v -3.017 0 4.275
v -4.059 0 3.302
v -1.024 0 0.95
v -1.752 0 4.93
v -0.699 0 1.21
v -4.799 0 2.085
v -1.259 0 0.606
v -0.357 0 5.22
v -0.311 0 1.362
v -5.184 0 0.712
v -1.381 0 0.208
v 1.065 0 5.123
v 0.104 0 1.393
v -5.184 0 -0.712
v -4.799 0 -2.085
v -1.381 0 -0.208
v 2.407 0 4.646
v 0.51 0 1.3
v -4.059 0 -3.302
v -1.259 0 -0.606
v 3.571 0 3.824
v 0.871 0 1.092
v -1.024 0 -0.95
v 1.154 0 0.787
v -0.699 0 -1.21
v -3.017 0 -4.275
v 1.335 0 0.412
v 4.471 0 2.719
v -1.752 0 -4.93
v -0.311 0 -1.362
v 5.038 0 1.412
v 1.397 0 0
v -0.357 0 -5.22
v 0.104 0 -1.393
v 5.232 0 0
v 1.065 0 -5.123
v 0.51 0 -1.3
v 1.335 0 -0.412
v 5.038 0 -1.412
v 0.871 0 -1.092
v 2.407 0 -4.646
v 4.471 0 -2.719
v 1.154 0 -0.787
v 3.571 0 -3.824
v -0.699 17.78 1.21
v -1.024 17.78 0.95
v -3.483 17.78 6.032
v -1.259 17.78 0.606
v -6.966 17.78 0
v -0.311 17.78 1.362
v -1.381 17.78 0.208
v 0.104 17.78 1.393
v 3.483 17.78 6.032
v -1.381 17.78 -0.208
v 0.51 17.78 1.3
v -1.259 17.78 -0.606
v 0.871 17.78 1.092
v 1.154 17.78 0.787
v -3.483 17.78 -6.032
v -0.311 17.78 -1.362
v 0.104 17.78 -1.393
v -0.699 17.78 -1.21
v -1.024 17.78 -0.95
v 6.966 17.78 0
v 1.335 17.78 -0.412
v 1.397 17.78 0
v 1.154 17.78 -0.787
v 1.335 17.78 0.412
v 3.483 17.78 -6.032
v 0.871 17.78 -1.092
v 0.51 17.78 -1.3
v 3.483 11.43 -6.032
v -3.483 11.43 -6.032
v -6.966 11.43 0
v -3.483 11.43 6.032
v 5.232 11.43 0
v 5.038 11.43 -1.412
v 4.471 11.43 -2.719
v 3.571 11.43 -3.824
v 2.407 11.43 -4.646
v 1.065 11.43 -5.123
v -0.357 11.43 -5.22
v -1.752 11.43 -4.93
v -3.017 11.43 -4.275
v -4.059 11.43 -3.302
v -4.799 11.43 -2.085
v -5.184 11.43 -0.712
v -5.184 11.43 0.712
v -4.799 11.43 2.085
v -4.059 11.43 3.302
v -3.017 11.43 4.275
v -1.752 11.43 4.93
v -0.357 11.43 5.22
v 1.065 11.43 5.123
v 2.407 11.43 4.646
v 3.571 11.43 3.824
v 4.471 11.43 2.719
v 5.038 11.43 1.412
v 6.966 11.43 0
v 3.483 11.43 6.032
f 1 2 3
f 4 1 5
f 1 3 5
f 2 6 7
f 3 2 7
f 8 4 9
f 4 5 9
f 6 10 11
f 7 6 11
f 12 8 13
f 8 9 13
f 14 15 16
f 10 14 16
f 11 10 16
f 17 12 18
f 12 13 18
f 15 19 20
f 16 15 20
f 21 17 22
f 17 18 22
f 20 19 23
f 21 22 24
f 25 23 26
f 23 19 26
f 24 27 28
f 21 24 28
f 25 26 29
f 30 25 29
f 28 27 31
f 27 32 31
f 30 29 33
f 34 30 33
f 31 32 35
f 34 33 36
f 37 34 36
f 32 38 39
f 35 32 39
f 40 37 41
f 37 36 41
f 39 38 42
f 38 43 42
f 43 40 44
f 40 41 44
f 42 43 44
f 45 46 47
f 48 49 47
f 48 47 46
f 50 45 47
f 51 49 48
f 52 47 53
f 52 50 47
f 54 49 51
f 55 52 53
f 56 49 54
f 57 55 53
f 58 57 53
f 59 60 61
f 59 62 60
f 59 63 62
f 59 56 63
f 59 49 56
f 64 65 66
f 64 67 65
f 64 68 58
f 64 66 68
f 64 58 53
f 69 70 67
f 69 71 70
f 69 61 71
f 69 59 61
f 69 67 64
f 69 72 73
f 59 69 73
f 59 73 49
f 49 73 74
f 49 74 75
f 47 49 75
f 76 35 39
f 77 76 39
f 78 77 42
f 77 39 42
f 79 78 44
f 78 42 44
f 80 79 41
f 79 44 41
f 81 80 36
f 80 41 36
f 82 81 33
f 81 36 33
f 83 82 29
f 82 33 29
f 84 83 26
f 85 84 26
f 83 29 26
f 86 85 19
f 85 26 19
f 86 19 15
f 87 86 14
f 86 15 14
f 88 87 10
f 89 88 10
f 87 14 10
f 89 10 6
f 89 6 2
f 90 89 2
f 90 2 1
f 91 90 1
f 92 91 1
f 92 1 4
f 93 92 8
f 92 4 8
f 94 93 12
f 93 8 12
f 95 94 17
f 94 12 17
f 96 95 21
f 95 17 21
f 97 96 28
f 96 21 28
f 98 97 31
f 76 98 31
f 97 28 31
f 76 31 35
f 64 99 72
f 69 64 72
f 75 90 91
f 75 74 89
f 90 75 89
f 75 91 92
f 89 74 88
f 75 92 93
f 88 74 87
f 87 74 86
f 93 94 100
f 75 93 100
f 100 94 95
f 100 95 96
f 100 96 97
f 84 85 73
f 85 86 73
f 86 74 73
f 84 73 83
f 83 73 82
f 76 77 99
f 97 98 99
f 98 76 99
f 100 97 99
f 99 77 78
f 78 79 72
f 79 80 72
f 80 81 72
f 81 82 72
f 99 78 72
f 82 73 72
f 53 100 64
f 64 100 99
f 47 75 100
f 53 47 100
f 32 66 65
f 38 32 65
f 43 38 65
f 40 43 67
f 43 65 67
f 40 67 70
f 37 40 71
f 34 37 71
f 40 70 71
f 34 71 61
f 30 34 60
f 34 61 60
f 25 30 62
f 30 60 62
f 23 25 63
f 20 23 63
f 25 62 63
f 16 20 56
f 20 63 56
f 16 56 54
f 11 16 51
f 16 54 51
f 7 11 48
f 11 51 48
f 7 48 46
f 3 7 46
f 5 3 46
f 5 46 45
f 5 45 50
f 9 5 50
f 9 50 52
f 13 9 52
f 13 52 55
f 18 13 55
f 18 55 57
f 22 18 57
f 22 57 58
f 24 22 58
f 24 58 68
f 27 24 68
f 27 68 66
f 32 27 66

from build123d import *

# Parameters (mm, degrees)
SKETCH1_R           = 5.2324
BOSS_EXTRUDE1_DEPTH = 11.43
BOSS_EXTRUDE2_DEPTH = 6.35
SKETCH3_R           = 1.397
CUT_EXTRUDE1_DEPTH  = 18.78


with BuildPart() as part:
    # Sketch1 → Boss-Extrude1 (new body)
    with BuildSketch(Plane(origin=(0, 0, 0), x_dir=(1, 0, 0), z_dir=(0, 1, 0))):
        Circle(SKETCH1_R)
    extrude(amount=BOSS_EXTRUDE1_DEPTH)

    # Sketch2 → Boss-Extrude2 (add)
    with BuildSketch(Plane(origin=(0, 11.43, 0), x_dir=(1, 0, 0), z_dir=(0, 1, 0))):
        Polygon((6.965730998, 0), (3.482865499, 6.0325), (-3.482865499, 6.0325), (-6.965730998, 0), (-3.482865499, -6.0325), (3.482865499, -6.0325), align=None)
    extrude(amount=BOSS_EXTRUDE2_DEPTH)

    # Sketch3 → Cut-Extrude1 (cut, through all)
    with BuildSketch(Plane(origin=(0, 17.78, 0), x_dir=(1, 0, 0), z_dir=(0, 1, 0))):
        Circle(SKETCH3_R)
    extrude(amount=-CUT_EXTRUDE1_DEPTH, mode=Mode.SUBTRACT)


solid = part.part
